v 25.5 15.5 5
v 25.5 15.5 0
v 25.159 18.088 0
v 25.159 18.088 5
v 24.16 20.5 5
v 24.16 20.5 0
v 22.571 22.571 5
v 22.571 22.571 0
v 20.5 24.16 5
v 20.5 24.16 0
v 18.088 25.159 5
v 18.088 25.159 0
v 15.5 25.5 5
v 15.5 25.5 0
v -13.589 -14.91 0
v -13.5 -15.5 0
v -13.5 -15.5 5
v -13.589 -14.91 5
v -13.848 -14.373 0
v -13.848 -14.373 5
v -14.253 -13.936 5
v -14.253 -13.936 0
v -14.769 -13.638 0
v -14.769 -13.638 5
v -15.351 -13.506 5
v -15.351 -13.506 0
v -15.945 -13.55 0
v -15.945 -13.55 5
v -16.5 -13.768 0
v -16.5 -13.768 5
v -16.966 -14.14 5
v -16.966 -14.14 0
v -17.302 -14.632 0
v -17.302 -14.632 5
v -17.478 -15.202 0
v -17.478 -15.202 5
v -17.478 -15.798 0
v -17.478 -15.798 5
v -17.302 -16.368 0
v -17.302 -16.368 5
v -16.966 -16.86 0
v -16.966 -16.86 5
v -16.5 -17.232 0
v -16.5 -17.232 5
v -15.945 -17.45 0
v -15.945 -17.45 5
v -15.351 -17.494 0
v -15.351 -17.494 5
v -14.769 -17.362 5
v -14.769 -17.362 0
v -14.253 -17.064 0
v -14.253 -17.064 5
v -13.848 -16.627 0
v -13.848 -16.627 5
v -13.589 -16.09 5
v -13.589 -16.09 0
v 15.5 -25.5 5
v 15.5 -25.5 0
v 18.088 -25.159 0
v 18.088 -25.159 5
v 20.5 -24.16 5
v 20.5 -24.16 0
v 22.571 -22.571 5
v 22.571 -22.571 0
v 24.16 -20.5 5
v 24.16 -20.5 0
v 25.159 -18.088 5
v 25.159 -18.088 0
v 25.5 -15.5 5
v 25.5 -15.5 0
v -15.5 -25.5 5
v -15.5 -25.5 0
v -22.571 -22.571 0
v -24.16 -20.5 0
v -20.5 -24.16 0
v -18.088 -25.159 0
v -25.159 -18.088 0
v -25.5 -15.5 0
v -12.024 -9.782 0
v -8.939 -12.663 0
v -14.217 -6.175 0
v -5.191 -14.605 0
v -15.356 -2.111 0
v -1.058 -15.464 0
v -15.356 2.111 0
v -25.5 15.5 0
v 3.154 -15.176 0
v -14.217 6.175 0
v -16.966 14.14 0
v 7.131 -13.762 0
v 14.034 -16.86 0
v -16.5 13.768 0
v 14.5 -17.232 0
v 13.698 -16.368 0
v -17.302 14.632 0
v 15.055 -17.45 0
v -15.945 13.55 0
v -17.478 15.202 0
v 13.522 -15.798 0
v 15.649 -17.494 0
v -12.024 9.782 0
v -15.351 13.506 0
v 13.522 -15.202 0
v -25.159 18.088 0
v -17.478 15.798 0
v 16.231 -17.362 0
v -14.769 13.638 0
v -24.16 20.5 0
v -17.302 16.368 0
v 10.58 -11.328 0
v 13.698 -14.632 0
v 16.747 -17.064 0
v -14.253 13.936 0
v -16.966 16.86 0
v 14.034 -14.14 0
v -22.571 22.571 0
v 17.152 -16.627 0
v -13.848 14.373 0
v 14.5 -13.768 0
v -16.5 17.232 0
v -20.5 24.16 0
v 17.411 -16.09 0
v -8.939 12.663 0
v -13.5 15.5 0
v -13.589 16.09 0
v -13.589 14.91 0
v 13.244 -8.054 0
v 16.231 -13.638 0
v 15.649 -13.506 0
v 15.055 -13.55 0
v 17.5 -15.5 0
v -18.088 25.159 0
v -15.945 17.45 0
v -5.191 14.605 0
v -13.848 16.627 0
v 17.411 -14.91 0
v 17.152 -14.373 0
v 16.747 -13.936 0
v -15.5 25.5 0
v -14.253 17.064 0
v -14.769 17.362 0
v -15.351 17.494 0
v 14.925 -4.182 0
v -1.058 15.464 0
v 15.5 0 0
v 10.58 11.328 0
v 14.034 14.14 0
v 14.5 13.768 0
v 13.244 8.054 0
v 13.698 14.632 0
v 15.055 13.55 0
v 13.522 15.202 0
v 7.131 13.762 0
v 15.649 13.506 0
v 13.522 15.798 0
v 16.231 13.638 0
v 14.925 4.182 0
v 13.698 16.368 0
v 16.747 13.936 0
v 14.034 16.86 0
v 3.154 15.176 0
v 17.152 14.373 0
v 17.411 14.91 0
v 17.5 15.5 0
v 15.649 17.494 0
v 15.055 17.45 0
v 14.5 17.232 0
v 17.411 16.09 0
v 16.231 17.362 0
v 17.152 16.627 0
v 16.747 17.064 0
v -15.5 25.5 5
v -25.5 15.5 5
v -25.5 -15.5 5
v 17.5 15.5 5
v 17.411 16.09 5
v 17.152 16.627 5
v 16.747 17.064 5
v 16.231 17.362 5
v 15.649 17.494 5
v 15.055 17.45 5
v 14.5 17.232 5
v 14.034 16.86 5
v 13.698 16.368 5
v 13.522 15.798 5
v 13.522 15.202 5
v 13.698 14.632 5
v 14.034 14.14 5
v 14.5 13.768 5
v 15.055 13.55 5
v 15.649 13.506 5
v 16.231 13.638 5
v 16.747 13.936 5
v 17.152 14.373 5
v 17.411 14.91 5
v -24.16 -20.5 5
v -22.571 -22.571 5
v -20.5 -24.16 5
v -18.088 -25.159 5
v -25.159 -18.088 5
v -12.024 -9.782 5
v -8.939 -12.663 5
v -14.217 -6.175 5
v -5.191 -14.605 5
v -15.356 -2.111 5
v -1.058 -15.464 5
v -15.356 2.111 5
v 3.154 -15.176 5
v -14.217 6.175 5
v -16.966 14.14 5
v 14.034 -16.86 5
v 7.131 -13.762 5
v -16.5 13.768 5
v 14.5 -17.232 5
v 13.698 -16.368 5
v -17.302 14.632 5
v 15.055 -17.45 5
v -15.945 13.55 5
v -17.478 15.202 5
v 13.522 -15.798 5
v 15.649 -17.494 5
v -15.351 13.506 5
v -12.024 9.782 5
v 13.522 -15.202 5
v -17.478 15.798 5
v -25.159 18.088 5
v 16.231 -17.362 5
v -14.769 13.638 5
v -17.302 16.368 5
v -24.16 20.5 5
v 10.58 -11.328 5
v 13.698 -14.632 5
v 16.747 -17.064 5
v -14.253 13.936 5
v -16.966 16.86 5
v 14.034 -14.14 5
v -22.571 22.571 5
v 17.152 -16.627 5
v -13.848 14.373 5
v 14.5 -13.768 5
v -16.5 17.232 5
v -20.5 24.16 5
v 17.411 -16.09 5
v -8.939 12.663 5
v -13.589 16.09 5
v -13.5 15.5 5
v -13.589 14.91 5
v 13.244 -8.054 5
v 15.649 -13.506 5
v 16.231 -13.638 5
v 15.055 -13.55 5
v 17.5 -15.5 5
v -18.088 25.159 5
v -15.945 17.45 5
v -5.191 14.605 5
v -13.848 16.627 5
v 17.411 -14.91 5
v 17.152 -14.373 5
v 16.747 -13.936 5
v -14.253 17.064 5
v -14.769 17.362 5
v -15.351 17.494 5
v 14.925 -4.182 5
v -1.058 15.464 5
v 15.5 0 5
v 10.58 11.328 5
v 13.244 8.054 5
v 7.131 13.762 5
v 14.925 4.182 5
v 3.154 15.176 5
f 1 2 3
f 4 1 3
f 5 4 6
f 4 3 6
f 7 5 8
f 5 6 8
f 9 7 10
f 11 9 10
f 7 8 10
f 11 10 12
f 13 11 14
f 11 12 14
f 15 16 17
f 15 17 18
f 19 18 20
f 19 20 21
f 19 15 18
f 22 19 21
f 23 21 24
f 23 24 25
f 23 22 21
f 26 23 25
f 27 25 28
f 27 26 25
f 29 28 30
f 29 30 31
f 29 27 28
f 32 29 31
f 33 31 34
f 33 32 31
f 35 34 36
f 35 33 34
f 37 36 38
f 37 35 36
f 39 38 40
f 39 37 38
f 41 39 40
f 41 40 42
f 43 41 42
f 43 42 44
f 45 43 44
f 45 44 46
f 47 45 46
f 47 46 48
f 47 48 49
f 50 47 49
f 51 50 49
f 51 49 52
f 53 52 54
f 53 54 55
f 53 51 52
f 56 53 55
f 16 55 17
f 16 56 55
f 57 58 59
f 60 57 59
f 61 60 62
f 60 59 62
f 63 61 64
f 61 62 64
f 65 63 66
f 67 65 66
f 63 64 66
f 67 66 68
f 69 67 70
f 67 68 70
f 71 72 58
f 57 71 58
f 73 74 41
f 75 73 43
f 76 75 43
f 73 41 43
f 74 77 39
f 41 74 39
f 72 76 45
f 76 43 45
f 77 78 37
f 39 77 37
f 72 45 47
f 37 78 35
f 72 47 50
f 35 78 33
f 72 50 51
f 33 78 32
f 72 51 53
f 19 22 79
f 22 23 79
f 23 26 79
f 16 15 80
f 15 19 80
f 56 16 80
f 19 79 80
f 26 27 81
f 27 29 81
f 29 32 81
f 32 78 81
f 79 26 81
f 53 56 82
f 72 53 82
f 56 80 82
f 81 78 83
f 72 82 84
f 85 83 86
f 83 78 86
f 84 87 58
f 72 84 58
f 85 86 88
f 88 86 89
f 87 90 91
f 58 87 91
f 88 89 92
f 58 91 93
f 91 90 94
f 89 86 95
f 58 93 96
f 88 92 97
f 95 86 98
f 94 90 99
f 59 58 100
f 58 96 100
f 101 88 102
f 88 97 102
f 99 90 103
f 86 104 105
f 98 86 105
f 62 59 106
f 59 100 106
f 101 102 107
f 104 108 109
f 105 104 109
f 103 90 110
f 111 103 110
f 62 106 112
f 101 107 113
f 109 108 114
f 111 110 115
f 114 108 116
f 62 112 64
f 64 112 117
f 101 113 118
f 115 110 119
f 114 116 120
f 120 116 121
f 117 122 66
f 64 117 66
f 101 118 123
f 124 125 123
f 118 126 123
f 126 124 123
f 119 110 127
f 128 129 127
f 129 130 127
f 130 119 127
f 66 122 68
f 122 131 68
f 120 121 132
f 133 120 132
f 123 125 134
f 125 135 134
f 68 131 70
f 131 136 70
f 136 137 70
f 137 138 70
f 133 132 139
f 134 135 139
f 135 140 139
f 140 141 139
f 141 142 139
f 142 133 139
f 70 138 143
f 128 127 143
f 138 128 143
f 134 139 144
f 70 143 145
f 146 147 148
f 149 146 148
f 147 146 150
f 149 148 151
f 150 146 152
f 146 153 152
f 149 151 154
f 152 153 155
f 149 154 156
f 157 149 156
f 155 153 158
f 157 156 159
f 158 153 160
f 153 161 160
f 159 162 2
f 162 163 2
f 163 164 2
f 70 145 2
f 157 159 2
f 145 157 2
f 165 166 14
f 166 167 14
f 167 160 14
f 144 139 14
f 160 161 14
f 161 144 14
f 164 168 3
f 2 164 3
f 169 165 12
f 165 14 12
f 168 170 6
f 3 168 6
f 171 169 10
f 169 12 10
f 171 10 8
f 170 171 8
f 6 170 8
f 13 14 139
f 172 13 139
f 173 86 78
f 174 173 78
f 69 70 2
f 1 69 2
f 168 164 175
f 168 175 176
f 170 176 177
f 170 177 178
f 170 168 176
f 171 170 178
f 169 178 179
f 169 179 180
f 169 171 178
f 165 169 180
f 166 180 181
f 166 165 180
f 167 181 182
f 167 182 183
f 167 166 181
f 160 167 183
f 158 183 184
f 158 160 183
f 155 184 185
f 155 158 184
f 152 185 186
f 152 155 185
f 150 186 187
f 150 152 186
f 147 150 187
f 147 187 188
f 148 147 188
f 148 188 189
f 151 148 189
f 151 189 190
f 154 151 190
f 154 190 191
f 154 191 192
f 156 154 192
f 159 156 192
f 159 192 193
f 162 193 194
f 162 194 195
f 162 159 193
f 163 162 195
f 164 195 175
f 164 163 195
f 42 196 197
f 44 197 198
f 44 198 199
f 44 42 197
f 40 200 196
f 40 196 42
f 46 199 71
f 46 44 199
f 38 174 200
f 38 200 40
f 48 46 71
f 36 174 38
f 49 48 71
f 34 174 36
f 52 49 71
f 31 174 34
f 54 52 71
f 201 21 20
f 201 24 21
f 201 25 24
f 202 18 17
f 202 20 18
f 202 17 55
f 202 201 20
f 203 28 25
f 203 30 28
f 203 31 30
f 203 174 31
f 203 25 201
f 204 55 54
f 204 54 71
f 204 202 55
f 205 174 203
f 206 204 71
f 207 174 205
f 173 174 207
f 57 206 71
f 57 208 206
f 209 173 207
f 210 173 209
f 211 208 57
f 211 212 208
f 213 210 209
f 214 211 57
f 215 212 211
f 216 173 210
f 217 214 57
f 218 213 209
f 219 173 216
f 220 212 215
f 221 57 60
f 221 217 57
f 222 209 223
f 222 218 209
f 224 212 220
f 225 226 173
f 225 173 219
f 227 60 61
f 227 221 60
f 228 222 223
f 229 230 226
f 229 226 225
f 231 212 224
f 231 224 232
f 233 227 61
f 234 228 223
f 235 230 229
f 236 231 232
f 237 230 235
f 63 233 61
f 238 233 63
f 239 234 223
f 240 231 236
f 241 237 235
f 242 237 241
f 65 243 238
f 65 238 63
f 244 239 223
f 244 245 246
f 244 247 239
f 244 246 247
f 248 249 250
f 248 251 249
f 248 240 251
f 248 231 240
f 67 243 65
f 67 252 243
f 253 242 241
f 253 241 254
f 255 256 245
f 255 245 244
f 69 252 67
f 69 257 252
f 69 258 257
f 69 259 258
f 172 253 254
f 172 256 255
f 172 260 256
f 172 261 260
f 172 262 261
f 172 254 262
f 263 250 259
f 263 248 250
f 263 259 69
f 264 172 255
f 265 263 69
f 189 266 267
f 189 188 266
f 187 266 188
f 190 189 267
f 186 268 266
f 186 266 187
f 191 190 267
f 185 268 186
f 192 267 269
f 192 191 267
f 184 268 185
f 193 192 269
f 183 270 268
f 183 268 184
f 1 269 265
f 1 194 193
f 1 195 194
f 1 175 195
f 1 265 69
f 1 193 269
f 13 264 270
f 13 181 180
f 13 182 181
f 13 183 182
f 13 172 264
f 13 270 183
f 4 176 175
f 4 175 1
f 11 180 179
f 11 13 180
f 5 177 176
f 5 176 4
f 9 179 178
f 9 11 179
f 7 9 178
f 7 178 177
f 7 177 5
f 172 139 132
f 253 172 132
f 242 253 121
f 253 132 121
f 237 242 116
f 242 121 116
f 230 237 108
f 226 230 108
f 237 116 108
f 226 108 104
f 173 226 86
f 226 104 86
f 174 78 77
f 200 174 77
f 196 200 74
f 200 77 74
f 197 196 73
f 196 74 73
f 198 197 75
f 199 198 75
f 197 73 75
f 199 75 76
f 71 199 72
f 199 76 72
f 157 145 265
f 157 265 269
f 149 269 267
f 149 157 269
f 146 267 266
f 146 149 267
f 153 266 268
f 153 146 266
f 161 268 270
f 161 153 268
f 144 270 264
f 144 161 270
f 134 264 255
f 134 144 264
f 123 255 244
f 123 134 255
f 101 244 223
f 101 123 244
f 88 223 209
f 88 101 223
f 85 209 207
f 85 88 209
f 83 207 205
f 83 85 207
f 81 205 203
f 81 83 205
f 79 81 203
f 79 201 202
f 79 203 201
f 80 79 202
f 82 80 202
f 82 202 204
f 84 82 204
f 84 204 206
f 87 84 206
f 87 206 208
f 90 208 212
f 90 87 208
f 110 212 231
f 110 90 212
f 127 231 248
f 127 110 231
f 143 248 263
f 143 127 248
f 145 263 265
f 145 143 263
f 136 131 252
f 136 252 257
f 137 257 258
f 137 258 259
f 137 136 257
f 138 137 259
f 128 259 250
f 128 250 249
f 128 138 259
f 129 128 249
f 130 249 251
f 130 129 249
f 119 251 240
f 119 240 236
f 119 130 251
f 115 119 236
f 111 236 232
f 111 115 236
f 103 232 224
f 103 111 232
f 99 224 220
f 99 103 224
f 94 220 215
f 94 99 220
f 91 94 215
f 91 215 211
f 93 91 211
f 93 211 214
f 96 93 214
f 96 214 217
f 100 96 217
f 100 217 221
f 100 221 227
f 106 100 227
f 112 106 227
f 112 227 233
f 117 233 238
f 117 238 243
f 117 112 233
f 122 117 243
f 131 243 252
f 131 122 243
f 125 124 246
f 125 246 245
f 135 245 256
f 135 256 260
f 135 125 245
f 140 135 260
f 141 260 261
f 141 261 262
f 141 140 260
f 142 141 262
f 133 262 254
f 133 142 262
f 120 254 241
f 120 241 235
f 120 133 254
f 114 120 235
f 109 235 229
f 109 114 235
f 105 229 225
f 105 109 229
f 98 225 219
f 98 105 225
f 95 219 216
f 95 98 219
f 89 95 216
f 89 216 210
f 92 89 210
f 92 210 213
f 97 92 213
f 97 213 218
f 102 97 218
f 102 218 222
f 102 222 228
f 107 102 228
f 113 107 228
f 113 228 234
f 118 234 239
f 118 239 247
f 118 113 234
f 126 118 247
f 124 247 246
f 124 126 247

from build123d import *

# Parameters (mm, degrees)
SKETCH_1_R          = 2
EXTRUDE_1_DEPTH     = 5
SKETCH_2_R          = 15.5
CUT_EXTRUDE_1_DEPTH = 30


with BuildPart() as part:
    # 草图1 → 凸台-拉伸1 (new body)
    with BuildSketch(Plane.XY):
        with BuildLine():
            Line((-15.5, -25.5), (15.5, -25.5))
            ThreePointArc((15.5, -25.5), (22.571067812, -22.571067812), (25.5, -15.5))
            Line((25.5, -15.5), (25.5, 15.5))
            ThreePointArc((25.5, 15.5), (22.571067812, 22.571067812), (15.5, 25.5))
            Line((15.5, 25.5), (-15.5, 25.5))
            ThreePointArc((-15.5, 25.5), (-22.571067812, 22.571067812), (-25.5, 15.5))
            Line((-25.5, 15.5), (-25.5, -15.5))
            ThreePointArc((-25.5, -15.5), (-22.571067812, -22.571067812), (-15.5, -25.5))
        make_face()
        with Locations((-15.5, 15.5)):
            Circle(SKETCH_1_R, mode=Mode.SUBTRACT)
        with Locations((15.5, 15.5)):
            Circle(SKETCH_1_R, mode=Mode.SUBTRACT)
        with Locations((15.5, -15.5)):
            Circle(SKETCH_1_R, mode=Mode.SUBTRACT)
        with Locations((-15.5, -15.5)):
            Circle(SKETCH_1_R, mode=Mode.SUBTRACT)
    extrude(amount=EXTRUDE_1_DEPTH)

    # 草图2 → 切除-拉伸1 (cut)
    with BuildSketch(Plane.XY):
        Circle(SKETCH_2_R)
    extrude(amount=CUT_EXTRUDE_1_DEPTH, mode=Mode.SUBTRACT)


solid = part.part
